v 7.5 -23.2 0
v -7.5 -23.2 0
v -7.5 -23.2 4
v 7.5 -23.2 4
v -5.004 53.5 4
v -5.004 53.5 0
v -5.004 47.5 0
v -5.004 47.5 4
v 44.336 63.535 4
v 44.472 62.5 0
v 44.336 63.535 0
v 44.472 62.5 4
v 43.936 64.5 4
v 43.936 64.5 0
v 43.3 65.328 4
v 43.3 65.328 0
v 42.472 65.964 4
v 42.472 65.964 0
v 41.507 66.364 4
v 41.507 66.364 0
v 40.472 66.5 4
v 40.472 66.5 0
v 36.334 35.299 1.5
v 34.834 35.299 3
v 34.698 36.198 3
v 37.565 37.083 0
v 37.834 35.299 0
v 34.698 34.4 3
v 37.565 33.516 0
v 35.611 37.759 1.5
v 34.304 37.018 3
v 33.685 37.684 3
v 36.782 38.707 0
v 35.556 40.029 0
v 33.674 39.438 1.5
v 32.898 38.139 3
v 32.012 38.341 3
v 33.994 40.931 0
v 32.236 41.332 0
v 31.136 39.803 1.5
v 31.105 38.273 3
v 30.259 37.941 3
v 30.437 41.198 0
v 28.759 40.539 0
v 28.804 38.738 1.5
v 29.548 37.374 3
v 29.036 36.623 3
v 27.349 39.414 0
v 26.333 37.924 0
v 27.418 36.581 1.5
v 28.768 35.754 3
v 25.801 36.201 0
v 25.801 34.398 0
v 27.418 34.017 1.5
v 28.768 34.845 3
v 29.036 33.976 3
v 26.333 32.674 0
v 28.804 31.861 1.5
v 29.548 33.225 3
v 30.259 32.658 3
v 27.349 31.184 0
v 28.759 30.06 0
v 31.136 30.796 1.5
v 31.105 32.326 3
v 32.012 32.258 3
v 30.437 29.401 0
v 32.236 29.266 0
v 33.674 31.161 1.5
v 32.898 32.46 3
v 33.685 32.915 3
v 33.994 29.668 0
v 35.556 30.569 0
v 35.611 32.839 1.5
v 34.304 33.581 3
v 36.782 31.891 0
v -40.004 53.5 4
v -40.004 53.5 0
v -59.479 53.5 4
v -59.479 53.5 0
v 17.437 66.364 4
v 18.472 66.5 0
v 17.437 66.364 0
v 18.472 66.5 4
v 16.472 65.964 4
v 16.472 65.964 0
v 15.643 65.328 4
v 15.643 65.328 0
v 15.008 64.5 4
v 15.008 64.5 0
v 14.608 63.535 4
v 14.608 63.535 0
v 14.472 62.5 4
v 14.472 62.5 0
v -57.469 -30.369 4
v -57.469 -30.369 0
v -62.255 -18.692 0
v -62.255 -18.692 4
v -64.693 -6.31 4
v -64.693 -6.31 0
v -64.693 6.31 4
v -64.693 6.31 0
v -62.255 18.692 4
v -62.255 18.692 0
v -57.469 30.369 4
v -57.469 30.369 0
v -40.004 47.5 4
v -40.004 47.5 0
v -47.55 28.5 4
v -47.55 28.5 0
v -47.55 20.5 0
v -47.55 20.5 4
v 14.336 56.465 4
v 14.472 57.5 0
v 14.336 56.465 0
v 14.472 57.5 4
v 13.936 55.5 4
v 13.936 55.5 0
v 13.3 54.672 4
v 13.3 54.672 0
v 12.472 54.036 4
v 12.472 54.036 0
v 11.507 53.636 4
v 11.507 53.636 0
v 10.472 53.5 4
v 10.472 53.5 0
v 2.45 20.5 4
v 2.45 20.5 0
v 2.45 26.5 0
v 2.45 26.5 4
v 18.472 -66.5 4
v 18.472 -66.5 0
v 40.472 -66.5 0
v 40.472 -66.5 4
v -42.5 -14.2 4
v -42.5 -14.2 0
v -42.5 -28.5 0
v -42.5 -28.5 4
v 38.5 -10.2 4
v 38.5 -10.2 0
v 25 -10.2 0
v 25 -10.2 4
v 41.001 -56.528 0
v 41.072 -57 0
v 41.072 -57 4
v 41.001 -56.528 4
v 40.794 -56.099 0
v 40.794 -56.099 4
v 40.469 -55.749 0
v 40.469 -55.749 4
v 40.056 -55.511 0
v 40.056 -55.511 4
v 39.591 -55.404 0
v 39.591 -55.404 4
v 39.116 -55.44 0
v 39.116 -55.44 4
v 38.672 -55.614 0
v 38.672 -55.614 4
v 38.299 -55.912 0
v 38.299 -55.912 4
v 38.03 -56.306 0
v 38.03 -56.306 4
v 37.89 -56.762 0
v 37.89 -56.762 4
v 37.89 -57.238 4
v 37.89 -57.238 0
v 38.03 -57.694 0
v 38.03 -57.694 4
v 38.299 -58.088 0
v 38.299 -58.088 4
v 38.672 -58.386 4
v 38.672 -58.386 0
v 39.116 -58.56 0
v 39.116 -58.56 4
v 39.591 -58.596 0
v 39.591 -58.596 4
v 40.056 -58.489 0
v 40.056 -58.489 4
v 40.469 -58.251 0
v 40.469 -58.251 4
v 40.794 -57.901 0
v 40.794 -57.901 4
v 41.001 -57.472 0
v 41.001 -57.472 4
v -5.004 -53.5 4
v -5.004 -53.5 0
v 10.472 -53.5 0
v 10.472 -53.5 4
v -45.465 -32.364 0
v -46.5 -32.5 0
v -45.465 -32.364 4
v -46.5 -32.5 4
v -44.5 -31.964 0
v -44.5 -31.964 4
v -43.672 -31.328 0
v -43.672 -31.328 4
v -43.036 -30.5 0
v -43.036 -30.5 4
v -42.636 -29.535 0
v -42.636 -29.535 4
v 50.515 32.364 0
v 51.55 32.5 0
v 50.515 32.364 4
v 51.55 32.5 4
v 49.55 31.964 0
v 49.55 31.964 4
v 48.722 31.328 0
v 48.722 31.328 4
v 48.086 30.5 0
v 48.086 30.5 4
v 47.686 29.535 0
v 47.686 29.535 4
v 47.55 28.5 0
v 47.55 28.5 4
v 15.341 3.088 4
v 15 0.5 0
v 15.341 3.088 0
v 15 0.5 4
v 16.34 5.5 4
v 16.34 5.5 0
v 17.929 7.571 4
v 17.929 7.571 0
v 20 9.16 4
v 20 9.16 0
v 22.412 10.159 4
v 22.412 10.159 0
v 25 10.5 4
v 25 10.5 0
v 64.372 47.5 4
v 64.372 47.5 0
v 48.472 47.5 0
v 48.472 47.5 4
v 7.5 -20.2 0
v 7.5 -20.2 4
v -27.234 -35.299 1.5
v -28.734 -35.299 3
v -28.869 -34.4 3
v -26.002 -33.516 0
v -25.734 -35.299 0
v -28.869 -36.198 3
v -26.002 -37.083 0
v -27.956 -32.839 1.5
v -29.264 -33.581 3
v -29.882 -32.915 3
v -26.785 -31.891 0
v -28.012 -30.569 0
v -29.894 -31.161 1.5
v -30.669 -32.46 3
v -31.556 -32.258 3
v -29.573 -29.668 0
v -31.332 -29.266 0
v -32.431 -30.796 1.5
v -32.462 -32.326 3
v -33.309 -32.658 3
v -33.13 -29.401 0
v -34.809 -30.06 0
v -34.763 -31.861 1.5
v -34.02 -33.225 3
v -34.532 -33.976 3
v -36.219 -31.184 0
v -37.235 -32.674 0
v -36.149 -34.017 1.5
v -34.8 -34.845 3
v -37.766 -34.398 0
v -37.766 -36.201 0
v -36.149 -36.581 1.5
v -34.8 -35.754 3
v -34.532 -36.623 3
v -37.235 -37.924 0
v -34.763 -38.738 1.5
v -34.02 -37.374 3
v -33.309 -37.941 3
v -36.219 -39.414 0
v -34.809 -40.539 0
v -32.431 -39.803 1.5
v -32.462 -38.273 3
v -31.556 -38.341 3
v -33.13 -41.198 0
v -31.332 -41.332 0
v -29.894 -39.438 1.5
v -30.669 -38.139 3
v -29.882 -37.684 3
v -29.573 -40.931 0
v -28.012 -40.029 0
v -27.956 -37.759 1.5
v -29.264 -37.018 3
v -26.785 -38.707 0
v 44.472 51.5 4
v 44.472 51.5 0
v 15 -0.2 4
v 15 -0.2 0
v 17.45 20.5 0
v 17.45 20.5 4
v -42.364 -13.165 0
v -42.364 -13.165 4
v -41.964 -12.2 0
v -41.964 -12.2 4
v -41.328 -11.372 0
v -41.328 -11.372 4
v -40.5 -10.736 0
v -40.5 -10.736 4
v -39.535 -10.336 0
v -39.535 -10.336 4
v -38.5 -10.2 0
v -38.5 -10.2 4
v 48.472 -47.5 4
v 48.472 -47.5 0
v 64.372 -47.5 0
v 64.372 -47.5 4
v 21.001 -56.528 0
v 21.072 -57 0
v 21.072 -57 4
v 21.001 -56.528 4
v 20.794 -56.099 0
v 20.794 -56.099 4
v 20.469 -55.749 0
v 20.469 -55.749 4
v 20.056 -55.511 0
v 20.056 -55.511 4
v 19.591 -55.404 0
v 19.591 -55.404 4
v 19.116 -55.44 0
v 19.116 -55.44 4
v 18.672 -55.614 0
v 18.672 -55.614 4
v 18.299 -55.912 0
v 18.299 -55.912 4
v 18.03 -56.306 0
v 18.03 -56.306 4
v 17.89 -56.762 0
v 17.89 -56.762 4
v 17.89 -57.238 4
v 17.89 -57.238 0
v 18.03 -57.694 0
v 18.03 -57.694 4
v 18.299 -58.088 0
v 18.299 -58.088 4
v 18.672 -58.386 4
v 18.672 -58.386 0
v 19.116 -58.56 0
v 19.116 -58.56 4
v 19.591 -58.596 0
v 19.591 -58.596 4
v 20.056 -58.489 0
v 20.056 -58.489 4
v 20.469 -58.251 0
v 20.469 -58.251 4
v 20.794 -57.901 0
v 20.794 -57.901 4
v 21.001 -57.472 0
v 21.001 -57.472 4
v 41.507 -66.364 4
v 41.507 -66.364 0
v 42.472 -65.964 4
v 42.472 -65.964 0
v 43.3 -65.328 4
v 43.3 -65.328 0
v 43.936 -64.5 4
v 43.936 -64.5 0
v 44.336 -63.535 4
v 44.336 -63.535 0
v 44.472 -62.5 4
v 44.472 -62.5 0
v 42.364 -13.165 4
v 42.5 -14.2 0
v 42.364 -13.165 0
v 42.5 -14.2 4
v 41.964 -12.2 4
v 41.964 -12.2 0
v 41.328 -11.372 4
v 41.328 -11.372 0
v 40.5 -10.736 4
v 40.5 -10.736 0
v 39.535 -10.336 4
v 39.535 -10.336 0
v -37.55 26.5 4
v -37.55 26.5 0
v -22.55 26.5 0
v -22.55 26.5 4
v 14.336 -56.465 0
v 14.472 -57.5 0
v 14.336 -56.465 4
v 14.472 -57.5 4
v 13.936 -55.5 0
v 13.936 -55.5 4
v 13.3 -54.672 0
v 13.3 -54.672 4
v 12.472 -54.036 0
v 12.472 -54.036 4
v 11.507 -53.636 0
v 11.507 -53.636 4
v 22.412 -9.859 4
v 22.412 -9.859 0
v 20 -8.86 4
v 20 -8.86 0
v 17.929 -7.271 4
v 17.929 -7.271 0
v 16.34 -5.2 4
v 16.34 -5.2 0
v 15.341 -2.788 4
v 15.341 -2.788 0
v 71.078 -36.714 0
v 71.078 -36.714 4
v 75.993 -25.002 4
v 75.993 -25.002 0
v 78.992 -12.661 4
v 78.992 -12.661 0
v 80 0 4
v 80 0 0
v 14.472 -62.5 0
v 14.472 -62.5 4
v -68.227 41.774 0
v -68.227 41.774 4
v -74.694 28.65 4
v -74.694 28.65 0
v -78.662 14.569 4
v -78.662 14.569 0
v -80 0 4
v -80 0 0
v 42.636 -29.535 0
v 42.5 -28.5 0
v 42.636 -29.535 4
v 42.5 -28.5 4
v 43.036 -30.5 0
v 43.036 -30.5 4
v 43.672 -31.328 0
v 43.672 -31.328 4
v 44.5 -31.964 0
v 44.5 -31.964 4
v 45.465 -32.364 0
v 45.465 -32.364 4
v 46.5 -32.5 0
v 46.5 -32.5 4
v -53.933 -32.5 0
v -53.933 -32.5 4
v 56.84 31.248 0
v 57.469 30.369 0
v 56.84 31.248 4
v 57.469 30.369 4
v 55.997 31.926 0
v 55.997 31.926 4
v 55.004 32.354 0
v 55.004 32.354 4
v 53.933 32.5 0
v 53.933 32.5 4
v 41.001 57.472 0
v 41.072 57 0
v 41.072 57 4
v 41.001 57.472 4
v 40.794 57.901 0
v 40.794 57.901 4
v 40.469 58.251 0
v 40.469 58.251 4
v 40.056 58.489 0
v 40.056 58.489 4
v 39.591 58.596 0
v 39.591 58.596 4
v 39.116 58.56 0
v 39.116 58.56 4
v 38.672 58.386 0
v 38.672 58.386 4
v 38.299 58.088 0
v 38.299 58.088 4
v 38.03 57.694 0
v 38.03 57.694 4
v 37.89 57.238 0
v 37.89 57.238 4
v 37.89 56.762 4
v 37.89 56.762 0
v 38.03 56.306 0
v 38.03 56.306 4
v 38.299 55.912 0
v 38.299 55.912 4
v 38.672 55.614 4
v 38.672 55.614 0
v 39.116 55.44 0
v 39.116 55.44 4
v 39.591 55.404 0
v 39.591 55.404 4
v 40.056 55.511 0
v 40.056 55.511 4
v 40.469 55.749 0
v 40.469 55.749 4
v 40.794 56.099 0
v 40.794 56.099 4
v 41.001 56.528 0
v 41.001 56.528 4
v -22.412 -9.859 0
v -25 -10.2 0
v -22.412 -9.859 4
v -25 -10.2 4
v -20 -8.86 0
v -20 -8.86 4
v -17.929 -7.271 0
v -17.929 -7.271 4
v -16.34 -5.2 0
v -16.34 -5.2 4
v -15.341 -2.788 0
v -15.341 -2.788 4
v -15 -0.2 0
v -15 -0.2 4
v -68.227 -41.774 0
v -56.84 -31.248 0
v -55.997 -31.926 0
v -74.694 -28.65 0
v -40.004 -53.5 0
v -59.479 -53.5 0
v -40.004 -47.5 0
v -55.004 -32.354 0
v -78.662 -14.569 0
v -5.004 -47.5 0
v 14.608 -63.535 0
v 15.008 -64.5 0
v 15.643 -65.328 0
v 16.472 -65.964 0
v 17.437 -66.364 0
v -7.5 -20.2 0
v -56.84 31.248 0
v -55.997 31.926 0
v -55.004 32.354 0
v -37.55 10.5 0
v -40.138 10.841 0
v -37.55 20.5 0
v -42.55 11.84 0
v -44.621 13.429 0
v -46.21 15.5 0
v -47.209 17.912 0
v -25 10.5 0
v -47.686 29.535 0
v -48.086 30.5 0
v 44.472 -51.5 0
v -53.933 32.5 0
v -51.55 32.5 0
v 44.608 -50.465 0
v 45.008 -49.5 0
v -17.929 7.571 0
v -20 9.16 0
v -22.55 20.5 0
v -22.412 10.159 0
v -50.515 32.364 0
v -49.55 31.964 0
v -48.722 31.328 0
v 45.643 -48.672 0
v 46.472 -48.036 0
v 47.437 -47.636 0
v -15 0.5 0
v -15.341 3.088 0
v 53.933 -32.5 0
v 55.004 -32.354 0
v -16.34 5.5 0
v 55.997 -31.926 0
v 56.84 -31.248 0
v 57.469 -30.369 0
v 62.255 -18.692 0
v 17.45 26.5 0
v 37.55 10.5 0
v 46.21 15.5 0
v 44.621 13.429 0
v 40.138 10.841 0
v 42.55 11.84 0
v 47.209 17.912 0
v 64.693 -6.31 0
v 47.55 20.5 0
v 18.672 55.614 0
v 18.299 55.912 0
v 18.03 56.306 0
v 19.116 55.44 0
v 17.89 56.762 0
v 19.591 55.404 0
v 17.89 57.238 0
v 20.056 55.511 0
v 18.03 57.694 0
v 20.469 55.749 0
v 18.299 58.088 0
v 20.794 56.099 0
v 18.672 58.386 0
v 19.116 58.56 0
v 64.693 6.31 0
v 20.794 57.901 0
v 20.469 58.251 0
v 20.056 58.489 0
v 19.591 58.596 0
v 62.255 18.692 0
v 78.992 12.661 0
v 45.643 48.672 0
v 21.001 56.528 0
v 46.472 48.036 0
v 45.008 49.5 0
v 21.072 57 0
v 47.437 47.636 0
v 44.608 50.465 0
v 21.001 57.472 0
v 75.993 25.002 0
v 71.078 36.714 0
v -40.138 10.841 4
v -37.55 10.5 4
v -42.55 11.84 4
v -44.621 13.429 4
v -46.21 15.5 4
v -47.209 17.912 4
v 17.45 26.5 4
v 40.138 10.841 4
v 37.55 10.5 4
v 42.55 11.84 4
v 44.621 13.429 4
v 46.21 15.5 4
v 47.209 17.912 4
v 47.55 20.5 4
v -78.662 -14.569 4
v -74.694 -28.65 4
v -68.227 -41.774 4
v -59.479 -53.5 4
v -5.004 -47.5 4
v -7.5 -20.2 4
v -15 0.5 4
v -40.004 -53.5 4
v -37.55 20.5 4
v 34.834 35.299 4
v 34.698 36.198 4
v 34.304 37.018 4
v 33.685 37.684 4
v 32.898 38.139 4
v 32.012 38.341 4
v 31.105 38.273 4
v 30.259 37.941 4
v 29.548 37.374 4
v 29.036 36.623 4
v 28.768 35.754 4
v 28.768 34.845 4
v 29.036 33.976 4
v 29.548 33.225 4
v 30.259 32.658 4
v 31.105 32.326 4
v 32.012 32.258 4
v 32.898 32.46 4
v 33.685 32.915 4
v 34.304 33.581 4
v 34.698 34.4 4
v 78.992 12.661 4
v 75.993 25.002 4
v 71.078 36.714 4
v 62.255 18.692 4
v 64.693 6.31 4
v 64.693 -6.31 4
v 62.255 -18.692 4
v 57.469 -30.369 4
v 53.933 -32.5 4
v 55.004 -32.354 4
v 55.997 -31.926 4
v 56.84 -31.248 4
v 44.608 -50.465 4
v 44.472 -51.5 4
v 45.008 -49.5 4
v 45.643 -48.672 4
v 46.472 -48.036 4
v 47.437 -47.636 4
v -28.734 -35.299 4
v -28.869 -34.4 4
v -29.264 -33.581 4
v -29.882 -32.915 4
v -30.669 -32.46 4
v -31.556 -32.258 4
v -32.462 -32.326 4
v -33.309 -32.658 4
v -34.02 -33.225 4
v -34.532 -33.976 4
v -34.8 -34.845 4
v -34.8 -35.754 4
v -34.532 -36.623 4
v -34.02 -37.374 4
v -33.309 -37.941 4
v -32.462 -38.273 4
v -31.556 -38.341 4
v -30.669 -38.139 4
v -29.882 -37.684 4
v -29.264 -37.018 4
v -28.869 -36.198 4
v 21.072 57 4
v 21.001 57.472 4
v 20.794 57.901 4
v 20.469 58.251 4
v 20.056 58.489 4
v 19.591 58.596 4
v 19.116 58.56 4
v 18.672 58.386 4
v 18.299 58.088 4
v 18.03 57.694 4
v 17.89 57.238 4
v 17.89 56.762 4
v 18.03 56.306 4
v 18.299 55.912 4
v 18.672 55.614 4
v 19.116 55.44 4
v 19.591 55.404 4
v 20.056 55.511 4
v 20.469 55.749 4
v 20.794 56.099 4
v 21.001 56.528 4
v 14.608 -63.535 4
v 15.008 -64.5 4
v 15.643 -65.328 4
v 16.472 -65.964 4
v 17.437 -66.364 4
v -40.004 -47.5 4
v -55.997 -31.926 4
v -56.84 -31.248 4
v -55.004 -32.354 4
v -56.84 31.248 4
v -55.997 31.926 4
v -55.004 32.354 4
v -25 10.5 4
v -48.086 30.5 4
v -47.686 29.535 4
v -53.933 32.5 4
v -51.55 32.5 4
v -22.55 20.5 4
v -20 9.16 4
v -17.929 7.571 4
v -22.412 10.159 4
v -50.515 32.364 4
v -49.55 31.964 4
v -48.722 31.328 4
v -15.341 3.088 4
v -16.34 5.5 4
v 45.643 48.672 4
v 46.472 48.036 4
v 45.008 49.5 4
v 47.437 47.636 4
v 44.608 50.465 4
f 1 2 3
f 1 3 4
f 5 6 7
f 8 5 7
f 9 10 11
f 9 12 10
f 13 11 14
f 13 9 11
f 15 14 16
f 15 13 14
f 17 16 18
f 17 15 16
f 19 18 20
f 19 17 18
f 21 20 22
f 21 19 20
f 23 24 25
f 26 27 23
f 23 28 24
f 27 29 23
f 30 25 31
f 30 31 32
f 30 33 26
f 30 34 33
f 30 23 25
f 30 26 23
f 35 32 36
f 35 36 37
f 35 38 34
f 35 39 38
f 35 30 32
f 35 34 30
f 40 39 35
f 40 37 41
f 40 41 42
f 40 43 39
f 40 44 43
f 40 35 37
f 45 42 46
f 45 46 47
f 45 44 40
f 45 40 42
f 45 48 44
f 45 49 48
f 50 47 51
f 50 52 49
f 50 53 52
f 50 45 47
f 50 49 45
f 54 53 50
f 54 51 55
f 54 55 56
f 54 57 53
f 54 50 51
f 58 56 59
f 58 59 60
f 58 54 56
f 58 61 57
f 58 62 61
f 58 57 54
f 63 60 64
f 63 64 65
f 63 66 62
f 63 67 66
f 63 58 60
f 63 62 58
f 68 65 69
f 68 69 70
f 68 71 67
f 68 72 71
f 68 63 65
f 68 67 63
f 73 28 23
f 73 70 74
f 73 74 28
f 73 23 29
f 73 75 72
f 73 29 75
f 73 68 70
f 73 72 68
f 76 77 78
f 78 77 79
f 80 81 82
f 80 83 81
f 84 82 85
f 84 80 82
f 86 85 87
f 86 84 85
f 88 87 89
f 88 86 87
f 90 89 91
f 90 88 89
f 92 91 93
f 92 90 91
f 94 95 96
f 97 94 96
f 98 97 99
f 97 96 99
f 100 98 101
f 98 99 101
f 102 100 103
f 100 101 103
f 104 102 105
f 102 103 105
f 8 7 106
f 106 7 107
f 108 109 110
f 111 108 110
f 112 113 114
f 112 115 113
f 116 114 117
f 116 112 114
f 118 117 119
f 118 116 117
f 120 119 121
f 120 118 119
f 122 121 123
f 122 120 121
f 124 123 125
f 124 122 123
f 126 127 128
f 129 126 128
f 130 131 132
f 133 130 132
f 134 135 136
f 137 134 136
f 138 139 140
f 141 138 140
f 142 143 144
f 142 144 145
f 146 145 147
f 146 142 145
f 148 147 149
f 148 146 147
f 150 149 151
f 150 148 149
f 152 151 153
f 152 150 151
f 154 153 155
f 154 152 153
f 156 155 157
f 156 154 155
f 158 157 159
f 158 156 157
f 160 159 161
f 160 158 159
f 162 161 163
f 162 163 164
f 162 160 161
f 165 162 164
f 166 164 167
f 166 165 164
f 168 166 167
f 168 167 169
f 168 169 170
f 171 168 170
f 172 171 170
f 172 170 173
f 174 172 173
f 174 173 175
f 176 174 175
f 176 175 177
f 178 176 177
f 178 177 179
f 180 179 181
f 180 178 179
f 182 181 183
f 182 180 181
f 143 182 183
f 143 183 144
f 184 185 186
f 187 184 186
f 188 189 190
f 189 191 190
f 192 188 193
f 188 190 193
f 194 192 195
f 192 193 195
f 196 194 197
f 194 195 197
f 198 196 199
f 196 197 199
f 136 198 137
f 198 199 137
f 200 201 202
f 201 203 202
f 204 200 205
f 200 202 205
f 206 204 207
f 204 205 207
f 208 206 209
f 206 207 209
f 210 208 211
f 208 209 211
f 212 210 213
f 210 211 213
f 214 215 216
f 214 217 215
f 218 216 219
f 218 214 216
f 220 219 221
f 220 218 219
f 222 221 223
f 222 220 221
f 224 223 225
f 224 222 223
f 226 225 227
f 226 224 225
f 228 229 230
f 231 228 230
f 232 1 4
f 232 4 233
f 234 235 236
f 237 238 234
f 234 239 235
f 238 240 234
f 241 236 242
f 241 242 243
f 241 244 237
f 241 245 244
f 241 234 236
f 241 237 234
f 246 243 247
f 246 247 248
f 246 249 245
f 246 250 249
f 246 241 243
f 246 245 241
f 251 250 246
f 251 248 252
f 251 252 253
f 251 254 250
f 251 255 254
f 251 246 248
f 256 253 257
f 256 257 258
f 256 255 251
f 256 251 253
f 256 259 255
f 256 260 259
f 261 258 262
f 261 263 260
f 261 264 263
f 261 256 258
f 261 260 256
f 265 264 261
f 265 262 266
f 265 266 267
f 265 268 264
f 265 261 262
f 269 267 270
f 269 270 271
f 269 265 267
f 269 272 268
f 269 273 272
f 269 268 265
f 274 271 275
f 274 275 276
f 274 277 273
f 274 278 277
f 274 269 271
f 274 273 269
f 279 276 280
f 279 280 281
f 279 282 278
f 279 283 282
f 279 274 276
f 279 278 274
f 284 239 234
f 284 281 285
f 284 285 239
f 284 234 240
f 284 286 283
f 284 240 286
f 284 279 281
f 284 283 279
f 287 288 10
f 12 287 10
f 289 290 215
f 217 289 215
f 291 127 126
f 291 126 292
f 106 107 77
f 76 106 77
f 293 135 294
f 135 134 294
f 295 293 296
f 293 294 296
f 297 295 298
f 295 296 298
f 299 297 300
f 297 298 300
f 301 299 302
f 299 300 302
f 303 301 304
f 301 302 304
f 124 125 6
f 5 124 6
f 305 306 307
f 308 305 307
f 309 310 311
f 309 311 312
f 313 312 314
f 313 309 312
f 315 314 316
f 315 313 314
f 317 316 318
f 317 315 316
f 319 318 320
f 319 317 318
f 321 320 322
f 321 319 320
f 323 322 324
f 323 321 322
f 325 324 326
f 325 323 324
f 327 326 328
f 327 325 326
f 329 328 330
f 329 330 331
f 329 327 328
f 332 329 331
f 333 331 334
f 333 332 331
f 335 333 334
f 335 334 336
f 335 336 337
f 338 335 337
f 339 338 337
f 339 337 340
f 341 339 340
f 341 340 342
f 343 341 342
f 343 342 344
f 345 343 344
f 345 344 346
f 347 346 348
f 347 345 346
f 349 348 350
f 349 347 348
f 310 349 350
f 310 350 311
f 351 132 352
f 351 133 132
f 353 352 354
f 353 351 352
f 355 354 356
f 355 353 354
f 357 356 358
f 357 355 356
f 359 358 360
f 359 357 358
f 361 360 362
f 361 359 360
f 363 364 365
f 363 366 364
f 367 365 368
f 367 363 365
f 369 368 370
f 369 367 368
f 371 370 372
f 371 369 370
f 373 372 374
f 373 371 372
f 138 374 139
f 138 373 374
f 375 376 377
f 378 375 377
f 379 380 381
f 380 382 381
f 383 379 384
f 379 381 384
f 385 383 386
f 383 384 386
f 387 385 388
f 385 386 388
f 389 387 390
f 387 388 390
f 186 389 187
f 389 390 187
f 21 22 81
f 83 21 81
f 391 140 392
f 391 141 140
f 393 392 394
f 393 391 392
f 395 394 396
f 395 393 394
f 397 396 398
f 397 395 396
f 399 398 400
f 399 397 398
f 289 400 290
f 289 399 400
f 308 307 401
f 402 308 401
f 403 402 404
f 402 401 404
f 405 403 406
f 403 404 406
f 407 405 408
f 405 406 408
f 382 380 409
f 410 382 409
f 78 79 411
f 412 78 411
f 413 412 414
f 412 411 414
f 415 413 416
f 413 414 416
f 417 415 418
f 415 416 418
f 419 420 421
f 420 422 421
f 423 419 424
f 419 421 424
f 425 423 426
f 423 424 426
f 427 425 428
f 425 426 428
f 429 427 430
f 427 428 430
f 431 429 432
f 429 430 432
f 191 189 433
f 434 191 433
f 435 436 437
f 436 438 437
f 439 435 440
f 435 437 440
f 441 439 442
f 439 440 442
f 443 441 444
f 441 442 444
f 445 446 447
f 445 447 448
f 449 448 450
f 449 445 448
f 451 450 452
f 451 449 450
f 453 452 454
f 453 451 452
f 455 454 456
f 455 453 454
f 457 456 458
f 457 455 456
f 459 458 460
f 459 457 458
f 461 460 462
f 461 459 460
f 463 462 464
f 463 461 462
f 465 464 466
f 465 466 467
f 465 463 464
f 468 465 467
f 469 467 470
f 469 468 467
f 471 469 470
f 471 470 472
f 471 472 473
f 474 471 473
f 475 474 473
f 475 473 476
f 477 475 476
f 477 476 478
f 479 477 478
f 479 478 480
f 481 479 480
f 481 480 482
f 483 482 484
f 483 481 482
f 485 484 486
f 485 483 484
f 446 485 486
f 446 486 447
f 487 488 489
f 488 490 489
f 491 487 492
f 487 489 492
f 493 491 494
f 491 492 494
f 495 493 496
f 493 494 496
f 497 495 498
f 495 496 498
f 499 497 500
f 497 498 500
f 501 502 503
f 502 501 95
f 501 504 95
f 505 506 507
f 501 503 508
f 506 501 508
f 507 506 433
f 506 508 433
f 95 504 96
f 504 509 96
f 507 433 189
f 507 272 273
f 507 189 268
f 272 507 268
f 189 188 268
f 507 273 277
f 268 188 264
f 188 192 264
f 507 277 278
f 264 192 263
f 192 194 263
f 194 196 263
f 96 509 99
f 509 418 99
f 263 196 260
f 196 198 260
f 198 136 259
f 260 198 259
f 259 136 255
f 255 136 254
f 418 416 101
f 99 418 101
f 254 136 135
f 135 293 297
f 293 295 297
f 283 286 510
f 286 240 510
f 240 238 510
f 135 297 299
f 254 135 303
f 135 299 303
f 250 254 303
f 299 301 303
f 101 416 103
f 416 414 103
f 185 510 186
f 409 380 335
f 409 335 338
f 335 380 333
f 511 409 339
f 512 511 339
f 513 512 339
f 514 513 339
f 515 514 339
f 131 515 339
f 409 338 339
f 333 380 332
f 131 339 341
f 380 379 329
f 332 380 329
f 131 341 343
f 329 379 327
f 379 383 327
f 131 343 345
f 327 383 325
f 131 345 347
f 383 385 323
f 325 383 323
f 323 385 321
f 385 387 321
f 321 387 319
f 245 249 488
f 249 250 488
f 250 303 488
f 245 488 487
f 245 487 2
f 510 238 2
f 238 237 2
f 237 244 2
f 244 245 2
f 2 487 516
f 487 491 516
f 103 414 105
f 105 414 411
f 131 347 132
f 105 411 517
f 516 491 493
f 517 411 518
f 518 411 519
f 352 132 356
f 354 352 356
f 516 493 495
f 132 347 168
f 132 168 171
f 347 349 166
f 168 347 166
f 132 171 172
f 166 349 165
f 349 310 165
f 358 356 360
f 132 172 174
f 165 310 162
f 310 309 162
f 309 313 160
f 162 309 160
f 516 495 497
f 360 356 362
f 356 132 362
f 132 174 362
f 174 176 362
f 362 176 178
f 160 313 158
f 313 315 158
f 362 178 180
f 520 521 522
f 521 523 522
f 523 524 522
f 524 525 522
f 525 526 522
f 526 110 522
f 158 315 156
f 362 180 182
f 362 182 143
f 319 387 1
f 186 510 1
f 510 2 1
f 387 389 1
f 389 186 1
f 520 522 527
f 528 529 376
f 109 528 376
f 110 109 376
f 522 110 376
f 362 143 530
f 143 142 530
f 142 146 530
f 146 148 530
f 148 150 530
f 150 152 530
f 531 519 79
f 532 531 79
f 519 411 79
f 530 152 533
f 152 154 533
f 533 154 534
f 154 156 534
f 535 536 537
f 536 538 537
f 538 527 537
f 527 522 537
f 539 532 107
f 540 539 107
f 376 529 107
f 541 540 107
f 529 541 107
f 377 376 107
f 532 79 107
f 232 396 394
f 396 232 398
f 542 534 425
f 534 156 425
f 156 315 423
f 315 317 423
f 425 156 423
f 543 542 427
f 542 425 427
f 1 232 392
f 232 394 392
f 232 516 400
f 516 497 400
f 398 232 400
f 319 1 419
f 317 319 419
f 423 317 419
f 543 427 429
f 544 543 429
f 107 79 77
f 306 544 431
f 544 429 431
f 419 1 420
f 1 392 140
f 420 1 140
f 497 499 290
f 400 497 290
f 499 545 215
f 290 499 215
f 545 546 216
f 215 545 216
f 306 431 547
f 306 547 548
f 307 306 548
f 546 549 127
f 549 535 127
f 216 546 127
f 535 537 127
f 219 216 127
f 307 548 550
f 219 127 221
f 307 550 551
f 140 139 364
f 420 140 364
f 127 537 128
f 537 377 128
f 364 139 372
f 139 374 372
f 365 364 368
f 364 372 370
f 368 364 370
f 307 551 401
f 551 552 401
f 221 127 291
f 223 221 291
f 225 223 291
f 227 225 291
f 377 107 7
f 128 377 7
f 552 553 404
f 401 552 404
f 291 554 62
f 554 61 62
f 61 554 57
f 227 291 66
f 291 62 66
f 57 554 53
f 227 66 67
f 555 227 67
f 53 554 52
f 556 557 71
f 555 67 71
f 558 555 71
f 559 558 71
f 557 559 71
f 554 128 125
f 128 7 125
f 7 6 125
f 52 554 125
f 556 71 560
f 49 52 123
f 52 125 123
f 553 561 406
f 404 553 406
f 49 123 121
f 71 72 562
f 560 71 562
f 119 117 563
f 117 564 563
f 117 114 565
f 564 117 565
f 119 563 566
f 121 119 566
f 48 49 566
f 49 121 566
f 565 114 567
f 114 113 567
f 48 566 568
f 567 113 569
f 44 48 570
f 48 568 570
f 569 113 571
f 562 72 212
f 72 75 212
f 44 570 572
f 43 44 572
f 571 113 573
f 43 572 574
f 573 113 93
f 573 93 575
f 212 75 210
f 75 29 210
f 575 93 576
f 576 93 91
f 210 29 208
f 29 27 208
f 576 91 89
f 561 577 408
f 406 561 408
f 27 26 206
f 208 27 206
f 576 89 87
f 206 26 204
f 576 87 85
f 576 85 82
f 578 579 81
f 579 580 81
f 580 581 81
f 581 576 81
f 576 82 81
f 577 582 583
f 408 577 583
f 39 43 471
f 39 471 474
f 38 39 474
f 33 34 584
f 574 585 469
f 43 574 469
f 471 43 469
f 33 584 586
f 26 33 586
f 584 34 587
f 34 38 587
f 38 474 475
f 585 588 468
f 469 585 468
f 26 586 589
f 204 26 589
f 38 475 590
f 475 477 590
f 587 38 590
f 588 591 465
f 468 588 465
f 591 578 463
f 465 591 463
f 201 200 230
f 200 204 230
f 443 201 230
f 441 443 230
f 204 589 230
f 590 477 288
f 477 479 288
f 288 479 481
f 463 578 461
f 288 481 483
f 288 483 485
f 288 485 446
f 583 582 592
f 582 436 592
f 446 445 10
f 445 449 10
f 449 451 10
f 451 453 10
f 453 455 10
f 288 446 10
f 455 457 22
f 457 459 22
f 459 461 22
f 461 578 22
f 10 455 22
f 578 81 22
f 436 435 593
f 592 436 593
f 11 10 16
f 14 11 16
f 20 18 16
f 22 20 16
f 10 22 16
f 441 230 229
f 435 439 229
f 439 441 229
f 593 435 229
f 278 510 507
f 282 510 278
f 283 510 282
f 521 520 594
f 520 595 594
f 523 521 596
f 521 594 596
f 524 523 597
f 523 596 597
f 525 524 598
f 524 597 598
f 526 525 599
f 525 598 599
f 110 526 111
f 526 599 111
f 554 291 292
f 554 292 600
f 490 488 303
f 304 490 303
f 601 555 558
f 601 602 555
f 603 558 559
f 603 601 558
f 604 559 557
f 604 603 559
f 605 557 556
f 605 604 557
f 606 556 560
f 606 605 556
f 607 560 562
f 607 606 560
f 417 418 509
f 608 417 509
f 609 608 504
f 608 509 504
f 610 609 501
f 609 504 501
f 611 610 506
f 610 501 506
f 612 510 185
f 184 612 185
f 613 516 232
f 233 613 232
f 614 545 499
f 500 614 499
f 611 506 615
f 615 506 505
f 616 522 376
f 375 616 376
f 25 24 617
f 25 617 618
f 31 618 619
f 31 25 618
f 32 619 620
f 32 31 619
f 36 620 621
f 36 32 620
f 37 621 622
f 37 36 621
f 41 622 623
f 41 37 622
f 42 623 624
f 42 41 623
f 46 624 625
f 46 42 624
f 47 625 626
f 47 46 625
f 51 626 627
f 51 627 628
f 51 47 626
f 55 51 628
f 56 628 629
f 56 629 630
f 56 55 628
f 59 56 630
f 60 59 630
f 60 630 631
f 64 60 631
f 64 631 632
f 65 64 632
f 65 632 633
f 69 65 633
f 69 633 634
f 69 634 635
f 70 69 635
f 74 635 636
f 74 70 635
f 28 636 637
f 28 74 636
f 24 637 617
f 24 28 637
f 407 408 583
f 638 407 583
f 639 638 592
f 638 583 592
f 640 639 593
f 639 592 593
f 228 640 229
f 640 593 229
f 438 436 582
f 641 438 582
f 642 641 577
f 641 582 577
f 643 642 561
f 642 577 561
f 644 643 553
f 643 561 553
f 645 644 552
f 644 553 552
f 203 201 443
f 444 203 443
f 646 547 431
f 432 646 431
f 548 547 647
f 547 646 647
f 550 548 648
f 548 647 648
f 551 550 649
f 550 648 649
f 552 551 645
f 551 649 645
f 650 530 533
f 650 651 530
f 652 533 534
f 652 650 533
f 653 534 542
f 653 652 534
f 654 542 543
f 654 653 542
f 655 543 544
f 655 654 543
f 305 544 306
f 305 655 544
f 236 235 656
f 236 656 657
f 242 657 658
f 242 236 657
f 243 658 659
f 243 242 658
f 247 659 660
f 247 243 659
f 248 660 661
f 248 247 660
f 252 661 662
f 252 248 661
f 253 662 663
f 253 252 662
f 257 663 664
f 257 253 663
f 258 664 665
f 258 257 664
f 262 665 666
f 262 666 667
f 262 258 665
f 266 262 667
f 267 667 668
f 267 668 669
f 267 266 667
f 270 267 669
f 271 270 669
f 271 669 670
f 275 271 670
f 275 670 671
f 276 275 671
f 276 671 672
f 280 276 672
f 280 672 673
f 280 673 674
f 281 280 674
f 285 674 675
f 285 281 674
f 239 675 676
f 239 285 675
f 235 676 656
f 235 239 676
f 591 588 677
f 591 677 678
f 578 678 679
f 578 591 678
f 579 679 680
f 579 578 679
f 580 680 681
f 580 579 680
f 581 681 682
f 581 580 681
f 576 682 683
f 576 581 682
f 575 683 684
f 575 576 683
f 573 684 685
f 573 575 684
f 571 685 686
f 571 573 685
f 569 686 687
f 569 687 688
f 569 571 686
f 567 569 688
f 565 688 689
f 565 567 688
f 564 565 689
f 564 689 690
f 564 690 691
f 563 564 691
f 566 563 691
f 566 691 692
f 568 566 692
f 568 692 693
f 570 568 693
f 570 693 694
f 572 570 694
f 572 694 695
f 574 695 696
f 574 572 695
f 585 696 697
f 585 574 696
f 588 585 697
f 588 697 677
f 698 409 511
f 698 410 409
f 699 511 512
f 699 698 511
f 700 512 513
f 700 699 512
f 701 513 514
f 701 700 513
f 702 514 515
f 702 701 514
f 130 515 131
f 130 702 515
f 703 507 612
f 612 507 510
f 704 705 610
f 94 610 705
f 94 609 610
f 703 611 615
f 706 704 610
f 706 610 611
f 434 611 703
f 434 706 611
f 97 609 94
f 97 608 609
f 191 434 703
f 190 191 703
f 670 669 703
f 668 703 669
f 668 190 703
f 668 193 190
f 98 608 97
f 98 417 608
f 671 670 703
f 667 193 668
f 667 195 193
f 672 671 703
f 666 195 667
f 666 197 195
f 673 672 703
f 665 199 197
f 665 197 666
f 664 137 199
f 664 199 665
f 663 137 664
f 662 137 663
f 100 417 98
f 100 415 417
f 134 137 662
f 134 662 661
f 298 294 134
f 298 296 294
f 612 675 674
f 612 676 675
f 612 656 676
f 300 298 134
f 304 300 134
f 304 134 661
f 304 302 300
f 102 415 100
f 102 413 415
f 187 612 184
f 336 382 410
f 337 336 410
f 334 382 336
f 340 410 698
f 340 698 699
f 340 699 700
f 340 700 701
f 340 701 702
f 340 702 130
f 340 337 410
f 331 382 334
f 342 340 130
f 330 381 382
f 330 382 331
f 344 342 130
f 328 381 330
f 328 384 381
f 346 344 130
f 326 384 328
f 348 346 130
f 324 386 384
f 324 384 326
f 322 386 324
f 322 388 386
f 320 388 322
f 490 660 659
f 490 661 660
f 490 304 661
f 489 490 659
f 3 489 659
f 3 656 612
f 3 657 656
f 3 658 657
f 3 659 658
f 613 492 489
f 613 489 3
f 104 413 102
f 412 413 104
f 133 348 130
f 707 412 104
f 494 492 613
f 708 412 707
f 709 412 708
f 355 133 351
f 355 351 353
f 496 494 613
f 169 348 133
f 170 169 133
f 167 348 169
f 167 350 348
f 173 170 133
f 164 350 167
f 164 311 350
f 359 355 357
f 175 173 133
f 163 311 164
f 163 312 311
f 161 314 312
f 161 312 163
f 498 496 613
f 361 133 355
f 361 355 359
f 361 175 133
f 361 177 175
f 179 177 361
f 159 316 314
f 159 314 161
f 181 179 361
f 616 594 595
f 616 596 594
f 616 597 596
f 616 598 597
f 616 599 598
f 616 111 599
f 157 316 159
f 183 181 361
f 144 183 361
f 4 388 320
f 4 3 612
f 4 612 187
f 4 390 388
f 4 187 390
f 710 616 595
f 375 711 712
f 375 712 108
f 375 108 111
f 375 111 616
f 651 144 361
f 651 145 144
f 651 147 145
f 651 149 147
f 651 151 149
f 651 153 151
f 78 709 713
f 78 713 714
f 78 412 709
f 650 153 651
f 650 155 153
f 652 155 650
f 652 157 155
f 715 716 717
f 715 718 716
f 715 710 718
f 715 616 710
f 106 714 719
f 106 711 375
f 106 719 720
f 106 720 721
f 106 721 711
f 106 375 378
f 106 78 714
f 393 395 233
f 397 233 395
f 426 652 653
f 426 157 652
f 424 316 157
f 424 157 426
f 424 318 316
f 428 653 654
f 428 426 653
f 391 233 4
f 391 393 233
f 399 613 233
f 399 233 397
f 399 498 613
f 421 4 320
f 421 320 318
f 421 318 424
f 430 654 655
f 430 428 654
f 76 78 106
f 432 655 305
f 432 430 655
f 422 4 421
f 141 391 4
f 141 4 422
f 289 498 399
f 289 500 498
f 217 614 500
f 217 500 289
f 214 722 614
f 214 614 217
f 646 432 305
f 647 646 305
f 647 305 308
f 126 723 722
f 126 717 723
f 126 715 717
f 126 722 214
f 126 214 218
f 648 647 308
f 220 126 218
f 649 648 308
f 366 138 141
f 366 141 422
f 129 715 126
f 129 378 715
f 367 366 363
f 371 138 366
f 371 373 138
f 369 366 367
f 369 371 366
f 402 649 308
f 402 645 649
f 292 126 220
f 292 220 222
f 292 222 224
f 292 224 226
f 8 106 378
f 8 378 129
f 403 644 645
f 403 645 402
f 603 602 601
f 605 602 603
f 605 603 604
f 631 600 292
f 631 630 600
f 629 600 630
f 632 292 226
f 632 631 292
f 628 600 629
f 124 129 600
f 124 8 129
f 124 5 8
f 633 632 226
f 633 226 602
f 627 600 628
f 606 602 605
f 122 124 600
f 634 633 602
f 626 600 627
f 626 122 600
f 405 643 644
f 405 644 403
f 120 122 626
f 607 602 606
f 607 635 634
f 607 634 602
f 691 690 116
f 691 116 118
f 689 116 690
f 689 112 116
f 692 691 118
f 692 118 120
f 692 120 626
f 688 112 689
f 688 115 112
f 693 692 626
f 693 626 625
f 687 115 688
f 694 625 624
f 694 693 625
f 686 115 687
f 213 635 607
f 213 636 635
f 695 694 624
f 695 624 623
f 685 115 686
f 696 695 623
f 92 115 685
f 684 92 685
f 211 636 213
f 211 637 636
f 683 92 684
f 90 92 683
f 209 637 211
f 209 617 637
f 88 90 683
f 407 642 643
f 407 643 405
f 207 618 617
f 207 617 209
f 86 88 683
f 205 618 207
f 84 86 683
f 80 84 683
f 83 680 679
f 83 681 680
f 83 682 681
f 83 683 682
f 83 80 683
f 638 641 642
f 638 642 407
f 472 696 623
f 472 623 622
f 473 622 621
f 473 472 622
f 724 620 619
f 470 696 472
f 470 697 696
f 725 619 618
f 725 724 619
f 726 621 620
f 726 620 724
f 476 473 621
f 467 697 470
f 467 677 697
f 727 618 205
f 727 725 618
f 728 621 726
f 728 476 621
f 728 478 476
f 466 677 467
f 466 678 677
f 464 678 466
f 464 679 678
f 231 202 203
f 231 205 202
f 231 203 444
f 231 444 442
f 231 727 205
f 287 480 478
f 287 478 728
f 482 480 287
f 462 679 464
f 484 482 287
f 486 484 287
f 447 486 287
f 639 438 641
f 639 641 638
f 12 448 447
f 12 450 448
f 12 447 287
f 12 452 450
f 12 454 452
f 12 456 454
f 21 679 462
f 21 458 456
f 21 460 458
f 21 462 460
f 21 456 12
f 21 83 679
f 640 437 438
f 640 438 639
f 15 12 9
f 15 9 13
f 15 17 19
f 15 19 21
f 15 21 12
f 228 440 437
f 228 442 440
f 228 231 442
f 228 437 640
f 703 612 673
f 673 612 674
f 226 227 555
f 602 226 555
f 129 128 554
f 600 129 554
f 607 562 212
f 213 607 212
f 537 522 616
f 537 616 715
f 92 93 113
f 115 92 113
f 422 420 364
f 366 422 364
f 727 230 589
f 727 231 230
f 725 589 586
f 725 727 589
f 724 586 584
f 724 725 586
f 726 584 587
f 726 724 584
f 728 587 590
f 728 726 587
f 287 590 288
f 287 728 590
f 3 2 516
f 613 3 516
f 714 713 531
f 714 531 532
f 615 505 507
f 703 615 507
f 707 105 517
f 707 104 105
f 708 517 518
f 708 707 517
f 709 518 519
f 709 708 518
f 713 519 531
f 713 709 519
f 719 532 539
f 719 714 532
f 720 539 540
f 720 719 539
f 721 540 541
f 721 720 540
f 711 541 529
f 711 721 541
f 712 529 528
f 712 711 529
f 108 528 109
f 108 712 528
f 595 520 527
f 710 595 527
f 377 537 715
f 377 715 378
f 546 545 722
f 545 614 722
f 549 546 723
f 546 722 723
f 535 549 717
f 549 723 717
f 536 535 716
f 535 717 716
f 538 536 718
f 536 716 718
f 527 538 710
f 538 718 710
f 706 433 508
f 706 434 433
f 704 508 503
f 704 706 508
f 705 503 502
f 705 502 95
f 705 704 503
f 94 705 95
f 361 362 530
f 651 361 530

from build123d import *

# Parameters (mm, degrees)
ESBO_O1_R                = 3.05
ESBO_O1_W                = 15
ESBO_O1_H                = 3
ESBO_O1_R_2              = 1.6
ESBO_O1_H_2              = 6
RESSALTO_EXTRUS_O1_DEPTH = 4
CHANFRO1_SIZE            = 3
FILETE1_R                = 4
FILETE2_R                = 10


with BuildPart() as part:
    # Esboço1 → Ressalto-extrusão1 (new body)
    with BuildSketch(Plane.XY):
        with BuildLine():
            Line((14.471901241, -53.5), (14.471901241, -66.5))
            Line((14.471901241, -66.5), (44.471901241, -66.5))
            Line((44.471901241, -66.5), (44.471901241, -47.5))
            Line((44.471901241, -47.5), (64.371965948, -47.5))
            ThreePointArc((64.371965948, -47.5), (75.99262226, -25.002427124), (80, 0))
            ThreePointArc((80, 0), (75.99262226, 25.002427124), (64.371965948, 47.5))
            Line((64.371965948, 47.5), (44.471901241, 47.5))
            Line((44.471901241, 47.5), (44.471901241, 66.5))
            Line((44.471901241, 66.5), (14.471901241, 66.5))
            Line((14.471901241, 66.5), (14.471901241, 53.5))
            Line((14.471901241, 53.5), (-5.003543323, 53.5))
            Line((-5.003543323, 53.5), (-5.003543323, 47.5))
            Line((-5.003543323, 47.5), (-40.003543323, 47.5))
            Line((-40.003543323, 47.5), (-40.003543323, 53.5))
            Line((-40.003543323, 53.5), (-59.478987886, 53.5))
            ThreePointArc((-59.478987886, 53.5), (-74.693771597, 28.650313865), (-80, 0))
            ThreePointArc((-80, 0), (-74.693771597, -28.650313865), (-59.478987886, -53.5))
            Line((-59.478987886, -53.5), (-40.003543323, -53.5))
            Line((-40.003543323, -53.5), (-40.003543323, -47.5))
            Line((-40.003543323, -47.5), (-5.003543323, -47.5))
            Line((-5.003543323, -47.5), (-5.003543323, -53.5))
            Line((-5.003543323, -53.5), (14.471901241, -53.5))
        make_face()
        with BuildLine():
            ThreePointArc((-56.291651246, -32.5), (-65, 0), (-56.291651246, 32.5))
            Line((-56.291651246, 32.5), (-47.55, 32.5))
            Line((-47.55, 32.5), (-47.55, 10.5))
            Line((-47.55, 10.5), (-15, 10.5))
            Line((-15, 10.5), (-15, -10.2))
            Line((-15, -10.2), (-42.5, -10.2))
            Line((-42.5, -10.2), (-42.5, -32.5))
            Line((-42.5, -32.5), (-56.291651246, -32.5))
        make_face(mode=Mode.SUBTRACT)
        with Locations((-31.783703802, -35.29937921)):
            Circle(ESBO_O1_R, mode=Mode.SUBTRACT)
        with Locations((0, -21.7)):
            Rectangle(ESBO_O1_W, ESBO_O1_H, mode=Mode.SUBTRACT)
        with Locations((19.471901241, -57)):
            Circle(ESBO_O1_R_2, mode=Mode.SUBTRACT)
        with Locations((39.471901241, -57)):
            Circle(ESBO_O1_R_2, mode=Mode.SUBTRACT)
        with BuildLine():
            Line((42.5, -10.2), (15, -10.2))
            Line((15, -10.2), (15, 10.5))
            Line((15, 10.5), (47.55, 10.5))
            Line((47.55, 10.5), (47.55, 32.5))
            Line((47.55, 32.5), (56.291651246, 32.5))
            ThreePointArc((56.291651246, 32.5), (65, 0), (56.291651246, -32.5))
            Line((56.291651246, -32.5), (42.5, -32.5))
            Line((42.5, -32.5), (42.5, -10.2))
        make_face(mode=Mode.SUBTRACT)
        with Locations((-30.05, 23.5)):
            Rectangle(ESBO_O1_W, ESBO_O1_H_2, mode=Mode.SUBTRACT)
        with Locations((9.95, 23.5)):
            Rectangle(ESBO_O1_W, ESBO_O1_H_2, mode=Mode.SUBTRACT)
        with Locations((31.783703802, 35.29937921)):
            Circle(ESBO_O1_R, mode=Mode.SUBTRACT)
        with Locations((19.471901241, 57)):
            Circle(ESBO_O1_R_2, mode=Mode.SUBTRACT)
        with Locations((39.471901241, 57)):
            Circle(ESBO_O1_R_2, mode=Mode.SUBTRACT)
    extrude(amount=RESSALTO_EXTRUS_O1_DEPTH)

    # Chanfro1
    chanfro1_edges = [part.edges().sort_by_distance(p)[0] for p in [
        (-34.833703802, -35.29937921, 0),
        (28.733703802, 35.29937921, 0),
    ]]
    chamfer(chanfro1_edges, length=CHANFRO1_SIZE)

    # Filete1
    filete1_edges = [part.edges().sort_by_distance(p)[0] for p in [
        (56.291651246, 32.5, 2),
        (47.55, 32.5, 2),
        (42.5, -10.2, 2),
        (42.5, -32.5, 2),
        (56.291651246, -32.5, 2),
        (14.471901241, 53.5, 2),
        (14.471901241, 66.5, 2),
        (44.471901241, 66.5, 2),
        (44.471901241, 47.5, 2),
        (44.471901241, -47.5, 2),
        (44.471901241, -66.5, 2),
        (14.471901241, -66.5, 2),
        (14.471901241, -53.5, 2),
        (-42.5, -32.5, 2),
        (-42.5, -10.2, 2),
        (-47.55, 32.5, 2),
        (-56.291651246, 32.5, 2),
        (-56.291651246, -32.5, 2),
    ]]
    fillet(filete1_edges, radius=FILETE1_R)

    # Filete2
    filete2_edges = [part.edges().sort_by_distance(p)[0] for p in [
        (47.55, 10.5, 2),
        (15, 10.5, 2),
        (15, -10.2, 2),
        (-15, -10.2, 2),
        (-15, 10.5, 2),
        (-47.55, 10.5, 2),
    ]]
    fillet(filete2_edges, radius=FILETE2_R)


solid = part.part
